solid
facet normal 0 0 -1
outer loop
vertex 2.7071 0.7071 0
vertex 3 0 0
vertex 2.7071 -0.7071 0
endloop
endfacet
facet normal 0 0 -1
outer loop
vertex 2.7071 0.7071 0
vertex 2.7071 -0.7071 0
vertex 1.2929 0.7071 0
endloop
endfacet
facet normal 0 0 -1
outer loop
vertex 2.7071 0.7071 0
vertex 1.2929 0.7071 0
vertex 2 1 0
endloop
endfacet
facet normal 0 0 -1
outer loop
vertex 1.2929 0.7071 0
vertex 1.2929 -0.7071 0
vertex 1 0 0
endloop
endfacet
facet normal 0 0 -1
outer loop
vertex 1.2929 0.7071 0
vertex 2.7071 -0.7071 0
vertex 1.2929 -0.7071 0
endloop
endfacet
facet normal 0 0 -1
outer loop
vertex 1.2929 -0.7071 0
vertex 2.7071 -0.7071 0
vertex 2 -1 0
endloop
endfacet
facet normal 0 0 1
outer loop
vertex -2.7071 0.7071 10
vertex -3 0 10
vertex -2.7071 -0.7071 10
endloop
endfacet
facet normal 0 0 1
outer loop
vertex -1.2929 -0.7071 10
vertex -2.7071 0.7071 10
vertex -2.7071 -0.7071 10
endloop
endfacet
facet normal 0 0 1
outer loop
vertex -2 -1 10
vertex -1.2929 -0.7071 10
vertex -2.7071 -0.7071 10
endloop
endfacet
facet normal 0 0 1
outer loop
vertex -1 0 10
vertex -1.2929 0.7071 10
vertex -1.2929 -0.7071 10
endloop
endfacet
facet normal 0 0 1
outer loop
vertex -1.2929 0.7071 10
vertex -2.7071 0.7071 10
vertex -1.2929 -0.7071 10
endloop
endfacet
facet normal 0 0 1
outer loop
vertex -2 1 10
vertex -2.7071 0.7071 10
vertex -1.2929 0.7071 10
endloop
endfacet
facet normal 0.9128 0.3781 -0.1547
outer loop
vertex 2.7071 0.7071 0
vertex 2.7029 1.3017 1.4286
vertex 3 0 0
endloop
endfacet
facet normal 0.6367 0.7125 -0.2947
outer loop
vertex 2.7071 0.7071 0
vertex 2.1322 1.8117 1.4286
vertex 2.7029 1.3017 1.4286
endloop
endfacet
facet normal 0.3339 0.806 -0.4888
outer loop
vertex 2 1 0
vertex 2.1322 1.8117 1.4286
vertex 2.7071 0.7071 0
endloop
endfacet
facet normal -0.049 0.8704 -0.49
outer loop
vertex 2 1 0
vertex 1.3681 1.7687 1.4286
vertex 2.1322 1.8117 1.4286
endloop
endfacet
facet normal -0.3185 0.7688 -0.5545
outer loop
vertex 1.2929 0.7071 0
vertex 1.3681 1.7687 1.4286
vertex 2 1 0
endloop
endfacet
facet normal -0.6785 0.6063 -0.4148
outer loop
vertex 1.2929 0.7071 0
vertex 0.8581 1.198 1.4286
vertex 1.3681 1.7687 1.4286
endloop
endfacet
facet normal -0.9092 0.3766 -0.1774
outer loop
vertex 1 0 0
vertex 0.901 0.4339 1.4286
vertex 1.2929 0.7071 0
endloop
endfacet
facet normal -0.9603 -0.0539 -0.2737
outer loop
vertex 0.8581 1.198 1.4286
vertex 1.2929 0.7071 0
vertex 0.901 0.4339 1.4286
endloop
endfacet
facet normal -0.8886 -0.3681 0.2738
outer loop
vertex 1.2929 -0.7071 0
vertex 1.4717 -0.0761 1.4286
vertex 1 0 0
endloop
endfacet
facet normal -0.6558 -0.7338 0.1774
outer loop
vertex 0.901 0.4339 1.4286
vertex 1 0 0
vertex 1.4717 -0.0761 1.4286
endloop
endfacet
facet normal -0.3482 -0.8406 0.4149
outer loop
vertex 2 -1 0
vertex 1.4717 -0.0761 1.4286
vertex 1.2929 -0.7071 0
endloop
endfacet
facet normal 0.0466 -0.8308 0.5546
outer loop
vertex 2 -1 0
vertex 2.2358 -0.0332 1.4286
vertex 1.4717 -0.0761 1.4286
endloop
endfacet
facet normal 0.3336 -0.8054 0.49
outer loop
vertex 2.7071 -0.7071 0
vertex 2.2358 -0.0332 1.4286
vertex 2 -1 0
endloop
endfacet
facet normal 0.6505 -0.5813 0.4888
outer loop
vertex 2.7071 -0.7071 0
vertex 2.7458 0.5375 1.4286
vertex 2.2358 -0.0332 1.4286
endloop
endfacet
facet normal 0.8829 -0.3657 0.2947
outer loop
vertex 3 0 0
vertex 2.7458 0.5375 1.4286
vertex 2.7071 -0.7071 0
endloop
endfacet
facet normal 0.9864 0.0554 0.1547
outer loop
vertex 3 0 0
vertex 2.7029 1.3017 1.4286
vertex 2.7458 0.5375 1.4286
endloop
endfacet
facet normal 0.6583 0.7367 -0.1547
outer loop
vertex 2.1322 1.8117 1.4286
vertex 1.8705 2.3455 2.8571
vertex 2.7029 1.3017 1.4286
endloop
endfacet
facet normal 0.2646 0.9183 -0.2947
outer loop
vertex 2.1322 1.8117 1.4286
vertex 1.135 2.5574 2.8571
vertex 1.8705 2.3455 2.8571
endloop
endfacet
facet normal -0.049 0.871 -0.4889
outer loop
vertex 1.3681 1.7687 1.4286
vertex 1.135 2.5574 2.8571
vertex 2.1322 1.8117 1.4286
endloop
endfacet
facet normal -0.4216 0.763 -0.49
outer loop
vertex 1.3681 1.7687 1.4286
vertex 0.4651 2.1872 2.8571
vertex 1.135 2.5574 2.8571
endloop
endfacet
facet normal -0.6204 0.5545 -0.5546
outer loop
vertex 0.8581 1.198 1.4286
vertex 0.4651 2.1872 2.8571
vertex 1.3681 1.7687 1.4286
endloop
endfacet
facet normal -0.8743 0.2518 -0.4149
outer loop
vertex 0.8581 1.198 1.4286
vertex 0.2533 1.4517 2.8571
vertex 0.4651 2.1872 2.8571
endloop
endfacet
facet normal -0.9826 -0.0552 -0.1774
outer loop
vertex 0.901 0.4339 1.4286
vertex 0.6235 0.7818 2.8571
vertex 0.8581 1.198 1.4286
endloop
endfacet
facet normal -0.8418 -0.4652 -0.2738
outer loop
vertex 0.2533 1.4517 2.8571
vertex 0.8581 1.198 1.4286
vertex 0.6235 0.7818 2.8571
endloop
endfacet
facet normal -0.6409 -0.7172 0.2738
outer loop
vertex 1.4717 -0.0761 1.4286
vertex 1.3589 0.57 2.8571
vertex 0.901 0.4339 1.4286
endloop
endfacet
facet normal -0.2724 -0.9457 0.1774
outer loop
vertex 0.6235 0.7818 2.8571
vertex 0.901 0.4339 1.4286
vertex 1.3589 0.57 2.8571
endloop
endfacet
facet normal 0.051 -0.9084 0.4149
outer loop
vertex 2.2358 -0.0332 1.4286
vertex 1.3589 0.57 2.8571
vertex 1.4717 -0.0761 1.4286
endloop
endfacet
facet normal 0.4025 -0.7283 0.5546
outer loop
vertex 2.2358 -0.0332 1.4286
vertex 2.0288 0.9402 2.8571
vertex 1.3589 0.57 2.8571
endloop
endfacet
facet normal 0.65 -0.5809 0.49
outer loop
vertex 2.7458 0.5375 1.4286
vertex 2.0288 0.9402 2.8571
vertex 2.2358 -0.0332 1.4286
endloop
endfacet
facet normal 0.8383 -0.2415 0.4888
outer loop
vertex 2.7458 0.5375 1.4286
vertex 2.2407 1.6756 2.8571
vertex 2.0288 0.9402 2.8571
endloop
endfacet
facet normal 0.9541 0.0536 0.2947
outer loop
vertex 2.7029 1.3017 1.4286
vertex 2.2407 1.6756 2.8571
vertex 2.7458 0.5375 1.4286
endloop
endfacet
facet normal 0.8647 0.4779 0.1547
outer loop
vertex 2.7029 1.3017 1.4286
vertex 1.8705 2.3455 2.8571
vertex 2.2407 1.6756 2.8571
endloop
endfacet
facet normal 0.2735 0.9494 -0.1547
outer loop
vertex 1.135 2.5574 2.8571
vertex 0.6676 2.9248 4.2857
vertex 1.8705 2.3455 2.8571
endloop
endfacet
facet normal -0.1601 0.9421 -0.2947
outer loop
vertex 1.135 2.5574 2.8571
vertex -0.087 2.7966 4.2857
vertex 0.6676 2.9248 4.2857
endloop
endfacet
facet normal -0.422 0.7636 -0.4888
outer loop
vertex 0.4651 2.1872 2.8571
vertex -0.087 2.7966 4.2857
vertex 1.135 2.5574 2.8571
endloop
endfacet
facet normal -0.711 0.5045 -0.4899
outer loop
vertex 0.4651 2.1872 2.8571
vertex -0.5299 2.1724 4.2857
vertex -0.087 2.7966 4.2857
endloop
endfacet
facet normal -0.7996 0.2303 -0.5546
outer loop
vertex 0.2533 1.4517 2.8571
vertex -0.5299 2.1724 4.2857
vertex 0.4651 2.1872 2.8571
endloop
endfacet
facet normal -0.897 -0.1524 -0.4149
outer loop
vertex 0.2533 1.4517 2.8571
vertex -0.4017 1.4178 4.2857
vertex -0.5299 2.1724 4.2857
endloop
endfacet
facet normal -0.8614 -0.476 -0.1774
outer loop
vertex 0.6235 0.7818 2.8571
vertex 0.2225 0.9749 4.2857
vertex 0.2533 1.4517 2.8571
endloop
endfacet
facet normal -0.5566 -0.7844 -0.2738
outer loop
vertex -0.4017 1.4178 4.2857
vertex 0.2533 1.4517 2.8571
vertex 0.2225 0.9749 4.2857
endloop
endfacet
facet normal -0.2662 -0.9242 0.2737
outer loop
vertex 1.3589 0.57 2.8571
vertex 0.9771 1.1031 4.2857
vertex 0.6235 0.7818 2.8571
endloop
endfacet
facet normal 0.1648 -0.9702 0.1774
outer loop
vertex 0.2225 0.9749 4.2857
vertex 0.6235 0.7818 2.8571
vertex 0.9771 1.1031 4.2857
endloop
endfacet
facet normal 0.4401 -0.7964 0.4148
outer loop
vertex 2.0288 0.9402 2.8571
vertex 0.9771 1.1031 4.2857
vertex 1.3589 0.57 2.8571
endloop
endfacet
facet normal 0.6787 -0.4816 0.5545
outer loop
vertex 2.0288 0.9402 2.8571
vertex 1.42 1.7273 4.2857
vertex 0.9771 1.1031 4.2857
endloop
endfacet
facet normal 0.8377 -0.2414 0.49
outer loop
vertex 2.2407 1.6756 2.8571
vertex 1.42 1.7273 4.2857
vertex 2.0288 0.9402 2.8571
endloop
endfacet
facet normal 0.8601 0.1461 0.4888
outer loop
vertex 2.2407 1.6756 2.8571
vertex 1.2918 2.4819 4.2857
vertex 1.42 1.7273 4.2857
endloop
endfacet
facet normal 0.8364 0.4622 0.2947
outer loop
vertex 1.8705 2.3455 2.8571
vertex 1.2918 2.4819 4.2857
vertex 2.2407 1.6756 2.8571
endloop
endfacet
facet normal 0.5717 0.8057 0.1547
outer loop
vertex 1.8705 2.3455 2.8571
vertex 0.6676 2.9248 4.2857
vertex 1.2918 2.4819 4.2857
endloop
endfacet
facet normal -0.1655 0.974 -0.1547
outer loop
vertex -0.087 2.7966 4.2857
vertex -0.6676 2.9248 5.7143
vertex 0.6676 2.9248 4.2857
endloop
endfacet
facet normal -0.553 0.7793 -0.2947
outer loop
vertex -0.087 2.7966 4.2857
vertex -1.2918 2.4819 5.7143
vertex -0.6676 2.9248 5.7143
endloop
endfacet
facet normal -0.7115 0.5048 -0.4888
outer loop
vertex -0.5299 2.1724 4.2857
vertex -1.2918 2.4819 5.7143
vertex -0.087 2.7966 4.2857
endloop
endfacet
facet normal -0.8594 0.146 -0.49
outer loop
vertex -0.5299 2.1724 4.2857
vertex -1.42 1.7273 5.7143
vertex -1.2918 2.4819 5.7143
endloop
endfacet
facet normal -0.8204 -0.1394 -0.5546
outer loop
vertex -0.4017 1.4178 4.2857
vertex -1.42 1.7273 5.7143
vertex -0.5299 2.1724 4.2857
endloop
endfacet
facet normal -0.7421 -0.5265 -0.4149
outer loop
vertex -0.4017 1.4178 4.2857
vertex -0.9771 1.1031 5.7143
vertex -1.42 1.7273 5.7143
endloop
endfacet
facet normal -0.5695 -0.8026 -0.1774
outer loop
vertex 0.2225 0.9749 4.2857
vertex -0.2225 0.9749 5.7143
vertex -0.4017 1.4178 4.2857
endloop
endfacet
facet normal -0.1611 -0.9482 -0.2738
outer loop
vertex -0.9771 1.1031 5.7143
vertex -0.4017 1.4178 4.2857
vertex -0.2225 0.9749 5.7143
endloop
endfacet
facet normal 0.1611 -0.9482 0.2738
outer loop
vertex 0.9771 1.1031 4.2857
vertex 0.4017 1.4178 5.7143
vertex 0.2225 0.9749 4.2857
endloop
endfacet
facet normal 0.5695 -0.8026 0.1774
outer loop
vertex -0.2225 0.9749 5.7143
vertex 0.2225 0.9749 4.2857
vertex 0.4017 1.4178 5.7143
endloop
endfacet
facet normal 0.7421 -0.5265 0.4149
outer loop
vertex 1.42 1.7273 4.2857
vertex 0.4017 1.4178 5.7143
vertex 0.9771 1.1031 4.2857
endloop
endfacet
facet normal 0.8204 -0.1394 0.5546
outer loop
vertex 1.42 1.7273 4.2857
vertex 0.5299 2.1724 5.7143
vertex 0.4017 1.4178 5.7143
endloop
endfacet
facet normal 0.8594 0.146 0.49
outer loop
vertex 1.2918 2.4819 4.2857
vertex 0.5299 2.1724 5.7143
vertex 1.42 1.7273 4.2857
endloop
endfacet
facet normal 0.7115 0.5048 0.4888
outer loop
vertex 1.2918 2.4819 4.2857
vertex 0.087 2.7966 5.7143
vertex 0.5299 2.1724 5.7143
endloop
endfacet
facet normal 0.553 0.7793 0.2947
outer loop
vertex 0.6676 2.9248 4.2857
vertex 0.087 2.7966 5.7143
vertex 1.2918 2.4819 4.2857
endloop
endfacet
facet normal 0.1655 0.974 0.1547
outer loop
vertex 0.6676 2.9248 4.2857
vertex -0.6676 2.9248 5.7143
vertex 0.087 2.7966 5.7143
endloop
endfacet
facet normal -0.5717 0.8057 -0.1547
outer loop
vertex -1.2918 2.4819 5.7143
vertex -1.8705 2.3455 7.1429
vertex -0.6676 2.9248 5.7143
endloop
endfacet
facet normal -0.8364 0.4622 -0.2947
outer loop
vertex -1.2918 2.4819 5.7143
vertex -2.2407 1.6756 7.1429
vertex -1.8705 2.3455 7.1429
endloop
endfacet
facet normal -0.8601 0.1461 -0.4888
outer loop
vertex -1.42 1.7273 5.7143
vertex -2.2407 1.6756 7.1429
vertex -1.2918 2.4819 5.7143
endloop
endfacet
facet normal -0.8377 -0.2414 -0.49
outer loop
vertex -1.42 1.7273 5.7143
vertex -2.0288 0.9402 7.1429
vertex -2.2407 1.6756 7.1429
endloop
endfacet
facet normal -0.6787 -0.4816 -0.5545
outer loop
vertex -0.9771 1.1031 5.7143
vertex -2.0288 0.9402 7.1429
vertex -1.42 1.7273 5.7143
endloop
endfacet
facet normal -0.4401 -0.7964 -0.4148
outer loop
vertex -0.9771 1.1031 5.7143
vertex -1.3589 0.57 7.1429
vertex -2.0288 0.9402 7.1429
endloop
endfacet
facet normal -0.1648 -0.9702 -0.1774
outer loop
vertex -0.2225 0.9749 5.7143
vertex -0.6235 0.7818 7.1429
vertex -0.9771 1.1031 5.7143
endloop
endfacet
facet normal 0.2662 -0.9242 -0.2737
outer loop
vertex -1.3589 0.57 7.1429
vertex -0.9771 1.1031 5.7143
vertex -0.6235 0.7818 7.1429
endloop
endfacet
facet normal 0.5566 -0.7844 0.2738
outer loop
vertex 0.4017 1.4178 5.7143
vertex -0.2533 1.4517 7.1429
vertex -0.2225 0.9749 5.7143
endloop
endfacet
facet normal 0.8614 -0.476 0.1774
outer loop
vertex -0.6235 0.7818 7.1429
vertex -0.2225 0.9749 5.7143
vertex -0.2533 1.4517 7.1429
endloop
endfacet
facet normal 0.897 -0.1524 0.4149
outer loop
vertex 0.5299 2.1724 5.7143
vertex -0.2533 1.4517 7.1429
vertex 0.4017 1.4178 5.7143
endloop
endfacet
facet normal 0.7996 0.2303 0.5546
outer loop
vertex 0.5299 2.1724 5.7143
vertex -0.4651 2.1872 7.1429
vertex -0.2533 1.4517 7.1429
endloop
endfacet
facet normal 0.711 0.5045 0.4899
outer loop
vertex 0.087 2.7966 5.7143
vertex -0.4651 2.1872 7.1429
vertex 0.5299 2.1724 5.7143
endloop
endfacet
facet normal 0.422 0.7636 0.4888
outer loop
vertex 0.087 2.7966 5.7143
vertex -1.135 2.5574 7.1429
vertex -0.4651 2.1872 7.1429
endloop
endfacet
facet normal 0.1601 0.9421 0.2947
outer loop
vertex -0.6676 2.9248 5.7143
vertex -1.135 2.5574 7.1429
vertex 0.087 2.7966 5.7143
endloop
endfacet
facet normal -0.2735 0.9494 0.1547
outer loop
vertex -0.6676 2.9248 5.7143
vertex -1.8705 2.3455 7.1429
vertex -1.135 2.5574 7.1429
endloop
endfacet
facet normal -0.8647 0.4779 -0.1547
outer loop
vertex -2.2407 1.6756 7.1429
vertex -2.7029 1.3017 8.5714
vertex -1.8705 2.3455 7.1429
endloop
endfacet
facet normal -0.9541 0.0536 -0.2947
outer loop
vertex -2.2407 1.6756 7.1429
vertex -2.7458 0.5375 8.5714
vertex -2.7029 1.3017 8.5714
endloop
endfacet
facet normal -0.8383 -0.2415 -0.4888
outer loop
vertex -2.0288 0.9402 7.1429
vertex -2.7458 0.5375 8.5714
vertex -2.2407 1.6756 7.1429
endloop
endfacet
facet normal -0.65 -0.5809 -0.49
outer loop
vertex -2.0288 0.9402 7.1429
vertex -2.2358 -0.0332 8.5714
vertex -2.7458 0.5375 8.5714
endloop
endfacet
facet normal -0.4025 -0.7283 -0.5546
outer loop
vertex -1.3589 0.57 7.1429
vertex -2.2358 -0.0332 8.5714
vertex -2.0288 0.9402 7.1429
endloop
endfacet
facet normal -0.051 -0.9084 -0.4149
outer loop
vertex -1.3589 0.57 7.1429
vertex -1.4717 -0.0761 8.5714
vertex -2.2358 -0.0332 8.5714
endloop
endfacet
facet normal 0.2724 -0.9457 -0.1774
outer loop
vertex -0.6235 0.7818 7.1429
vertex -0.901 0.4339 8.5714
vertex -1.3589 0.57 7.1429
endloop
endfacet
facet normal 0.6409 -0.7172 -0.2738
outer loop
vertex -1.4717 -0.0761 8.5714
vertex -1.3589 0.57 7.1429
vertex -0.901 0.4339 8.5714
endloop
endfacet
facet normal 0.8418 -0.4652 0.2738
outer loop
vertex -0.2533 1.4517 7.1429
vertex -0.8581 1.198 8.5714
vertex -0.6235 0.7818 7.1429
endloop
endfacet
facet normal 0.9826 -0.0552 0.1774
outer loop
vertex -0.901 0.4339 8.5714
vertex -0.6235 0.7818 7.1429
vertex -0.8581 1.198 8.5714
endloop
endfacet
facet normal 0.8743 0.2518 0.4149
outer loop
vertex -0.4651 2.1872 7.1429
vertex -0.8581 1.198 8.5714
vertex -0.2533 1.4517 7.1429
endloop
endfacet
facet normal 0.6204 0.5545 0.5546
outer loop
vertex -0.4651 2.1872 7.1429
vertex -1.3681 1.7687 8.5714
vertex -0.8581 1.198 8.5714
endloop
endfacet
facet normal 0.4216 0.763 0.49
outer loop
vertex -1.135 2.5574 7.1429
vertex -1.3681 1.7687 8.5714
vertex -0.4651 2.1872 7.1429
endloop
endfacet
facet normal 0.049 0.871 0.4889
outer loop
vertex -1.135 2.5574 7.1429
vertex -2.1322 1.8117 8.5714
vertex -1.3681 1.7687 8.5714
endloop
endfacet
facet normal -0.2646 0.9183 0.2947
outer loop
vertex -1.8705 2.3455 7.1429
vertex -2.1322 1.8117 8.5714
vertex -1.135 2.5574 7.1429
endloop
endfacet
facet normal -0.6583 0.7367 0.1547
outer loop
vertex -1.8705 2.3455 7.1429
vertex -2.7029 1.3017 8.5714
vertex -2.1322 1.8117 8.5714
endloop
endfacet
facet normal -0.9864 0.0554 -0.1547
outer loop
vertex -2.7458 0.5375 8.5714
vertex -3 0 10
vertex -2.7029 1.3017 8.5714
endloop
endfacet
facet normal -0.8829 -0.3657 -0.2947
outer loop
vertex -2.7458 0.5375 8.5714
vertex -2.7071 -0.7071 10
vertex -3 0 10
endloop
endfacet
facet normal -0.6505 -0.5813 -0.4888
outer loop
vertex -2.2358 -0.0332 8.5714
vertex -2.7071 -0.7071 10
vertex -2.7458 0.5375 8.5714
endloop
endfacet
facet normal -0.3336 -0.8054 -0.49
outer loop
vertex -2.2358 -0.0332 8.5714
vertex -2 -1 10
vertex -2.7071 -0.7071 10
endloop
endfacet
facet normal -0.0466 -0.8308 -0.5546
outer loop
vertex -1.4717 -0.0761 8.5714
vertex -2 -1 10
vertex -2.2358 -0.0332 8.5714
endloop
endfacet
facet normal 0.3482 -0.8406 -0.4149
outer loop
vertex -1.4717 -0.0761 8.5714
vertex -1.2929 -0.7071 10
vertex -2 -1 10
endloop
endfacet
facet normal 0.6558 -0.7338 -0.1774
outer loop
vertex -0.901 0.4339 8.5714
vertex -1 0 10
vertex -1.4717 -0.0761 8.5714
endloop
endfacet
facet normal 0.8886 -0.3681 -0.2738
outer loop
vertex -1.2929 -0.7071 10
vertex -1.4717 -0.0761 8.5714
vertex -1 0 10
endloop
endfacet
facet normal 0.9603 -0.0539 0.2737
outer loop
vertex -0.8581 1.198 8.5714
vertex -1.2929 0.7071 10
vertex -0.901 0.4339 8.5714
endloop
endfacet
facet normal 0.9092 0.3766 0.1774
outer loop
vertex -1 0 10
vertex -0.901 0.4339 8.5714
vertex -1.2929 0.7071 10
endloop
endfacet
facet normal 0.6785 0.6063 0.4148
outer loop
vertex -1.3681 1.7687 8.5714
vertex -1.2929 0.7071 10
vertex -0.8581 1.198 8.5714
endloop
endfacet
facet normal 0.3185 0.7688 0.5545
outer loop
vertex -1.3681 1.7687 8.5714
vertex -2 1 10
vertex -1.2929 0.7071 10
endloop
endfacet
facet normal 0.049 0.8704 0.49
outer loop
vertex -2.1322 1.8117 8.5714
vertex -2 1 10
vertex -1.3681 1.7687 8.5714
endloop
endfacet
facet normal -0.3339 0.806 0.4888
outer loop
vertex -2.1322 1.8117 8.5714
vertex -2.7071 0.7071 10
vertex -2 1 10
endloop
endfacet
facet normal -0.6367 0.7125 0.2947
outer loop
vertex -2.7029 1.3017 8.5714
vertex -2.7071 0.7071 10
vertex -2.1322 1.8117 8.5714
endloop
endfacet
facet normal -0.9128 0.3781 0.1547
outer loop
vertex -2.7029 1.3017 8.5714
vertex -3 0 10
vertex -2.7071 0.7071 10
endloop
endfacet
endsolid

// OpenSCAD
// negative twist, slices from the tessellation settings
linear_extrude(10, twist = -180) translate([2, 0]) circle(1, $fn = 8);
